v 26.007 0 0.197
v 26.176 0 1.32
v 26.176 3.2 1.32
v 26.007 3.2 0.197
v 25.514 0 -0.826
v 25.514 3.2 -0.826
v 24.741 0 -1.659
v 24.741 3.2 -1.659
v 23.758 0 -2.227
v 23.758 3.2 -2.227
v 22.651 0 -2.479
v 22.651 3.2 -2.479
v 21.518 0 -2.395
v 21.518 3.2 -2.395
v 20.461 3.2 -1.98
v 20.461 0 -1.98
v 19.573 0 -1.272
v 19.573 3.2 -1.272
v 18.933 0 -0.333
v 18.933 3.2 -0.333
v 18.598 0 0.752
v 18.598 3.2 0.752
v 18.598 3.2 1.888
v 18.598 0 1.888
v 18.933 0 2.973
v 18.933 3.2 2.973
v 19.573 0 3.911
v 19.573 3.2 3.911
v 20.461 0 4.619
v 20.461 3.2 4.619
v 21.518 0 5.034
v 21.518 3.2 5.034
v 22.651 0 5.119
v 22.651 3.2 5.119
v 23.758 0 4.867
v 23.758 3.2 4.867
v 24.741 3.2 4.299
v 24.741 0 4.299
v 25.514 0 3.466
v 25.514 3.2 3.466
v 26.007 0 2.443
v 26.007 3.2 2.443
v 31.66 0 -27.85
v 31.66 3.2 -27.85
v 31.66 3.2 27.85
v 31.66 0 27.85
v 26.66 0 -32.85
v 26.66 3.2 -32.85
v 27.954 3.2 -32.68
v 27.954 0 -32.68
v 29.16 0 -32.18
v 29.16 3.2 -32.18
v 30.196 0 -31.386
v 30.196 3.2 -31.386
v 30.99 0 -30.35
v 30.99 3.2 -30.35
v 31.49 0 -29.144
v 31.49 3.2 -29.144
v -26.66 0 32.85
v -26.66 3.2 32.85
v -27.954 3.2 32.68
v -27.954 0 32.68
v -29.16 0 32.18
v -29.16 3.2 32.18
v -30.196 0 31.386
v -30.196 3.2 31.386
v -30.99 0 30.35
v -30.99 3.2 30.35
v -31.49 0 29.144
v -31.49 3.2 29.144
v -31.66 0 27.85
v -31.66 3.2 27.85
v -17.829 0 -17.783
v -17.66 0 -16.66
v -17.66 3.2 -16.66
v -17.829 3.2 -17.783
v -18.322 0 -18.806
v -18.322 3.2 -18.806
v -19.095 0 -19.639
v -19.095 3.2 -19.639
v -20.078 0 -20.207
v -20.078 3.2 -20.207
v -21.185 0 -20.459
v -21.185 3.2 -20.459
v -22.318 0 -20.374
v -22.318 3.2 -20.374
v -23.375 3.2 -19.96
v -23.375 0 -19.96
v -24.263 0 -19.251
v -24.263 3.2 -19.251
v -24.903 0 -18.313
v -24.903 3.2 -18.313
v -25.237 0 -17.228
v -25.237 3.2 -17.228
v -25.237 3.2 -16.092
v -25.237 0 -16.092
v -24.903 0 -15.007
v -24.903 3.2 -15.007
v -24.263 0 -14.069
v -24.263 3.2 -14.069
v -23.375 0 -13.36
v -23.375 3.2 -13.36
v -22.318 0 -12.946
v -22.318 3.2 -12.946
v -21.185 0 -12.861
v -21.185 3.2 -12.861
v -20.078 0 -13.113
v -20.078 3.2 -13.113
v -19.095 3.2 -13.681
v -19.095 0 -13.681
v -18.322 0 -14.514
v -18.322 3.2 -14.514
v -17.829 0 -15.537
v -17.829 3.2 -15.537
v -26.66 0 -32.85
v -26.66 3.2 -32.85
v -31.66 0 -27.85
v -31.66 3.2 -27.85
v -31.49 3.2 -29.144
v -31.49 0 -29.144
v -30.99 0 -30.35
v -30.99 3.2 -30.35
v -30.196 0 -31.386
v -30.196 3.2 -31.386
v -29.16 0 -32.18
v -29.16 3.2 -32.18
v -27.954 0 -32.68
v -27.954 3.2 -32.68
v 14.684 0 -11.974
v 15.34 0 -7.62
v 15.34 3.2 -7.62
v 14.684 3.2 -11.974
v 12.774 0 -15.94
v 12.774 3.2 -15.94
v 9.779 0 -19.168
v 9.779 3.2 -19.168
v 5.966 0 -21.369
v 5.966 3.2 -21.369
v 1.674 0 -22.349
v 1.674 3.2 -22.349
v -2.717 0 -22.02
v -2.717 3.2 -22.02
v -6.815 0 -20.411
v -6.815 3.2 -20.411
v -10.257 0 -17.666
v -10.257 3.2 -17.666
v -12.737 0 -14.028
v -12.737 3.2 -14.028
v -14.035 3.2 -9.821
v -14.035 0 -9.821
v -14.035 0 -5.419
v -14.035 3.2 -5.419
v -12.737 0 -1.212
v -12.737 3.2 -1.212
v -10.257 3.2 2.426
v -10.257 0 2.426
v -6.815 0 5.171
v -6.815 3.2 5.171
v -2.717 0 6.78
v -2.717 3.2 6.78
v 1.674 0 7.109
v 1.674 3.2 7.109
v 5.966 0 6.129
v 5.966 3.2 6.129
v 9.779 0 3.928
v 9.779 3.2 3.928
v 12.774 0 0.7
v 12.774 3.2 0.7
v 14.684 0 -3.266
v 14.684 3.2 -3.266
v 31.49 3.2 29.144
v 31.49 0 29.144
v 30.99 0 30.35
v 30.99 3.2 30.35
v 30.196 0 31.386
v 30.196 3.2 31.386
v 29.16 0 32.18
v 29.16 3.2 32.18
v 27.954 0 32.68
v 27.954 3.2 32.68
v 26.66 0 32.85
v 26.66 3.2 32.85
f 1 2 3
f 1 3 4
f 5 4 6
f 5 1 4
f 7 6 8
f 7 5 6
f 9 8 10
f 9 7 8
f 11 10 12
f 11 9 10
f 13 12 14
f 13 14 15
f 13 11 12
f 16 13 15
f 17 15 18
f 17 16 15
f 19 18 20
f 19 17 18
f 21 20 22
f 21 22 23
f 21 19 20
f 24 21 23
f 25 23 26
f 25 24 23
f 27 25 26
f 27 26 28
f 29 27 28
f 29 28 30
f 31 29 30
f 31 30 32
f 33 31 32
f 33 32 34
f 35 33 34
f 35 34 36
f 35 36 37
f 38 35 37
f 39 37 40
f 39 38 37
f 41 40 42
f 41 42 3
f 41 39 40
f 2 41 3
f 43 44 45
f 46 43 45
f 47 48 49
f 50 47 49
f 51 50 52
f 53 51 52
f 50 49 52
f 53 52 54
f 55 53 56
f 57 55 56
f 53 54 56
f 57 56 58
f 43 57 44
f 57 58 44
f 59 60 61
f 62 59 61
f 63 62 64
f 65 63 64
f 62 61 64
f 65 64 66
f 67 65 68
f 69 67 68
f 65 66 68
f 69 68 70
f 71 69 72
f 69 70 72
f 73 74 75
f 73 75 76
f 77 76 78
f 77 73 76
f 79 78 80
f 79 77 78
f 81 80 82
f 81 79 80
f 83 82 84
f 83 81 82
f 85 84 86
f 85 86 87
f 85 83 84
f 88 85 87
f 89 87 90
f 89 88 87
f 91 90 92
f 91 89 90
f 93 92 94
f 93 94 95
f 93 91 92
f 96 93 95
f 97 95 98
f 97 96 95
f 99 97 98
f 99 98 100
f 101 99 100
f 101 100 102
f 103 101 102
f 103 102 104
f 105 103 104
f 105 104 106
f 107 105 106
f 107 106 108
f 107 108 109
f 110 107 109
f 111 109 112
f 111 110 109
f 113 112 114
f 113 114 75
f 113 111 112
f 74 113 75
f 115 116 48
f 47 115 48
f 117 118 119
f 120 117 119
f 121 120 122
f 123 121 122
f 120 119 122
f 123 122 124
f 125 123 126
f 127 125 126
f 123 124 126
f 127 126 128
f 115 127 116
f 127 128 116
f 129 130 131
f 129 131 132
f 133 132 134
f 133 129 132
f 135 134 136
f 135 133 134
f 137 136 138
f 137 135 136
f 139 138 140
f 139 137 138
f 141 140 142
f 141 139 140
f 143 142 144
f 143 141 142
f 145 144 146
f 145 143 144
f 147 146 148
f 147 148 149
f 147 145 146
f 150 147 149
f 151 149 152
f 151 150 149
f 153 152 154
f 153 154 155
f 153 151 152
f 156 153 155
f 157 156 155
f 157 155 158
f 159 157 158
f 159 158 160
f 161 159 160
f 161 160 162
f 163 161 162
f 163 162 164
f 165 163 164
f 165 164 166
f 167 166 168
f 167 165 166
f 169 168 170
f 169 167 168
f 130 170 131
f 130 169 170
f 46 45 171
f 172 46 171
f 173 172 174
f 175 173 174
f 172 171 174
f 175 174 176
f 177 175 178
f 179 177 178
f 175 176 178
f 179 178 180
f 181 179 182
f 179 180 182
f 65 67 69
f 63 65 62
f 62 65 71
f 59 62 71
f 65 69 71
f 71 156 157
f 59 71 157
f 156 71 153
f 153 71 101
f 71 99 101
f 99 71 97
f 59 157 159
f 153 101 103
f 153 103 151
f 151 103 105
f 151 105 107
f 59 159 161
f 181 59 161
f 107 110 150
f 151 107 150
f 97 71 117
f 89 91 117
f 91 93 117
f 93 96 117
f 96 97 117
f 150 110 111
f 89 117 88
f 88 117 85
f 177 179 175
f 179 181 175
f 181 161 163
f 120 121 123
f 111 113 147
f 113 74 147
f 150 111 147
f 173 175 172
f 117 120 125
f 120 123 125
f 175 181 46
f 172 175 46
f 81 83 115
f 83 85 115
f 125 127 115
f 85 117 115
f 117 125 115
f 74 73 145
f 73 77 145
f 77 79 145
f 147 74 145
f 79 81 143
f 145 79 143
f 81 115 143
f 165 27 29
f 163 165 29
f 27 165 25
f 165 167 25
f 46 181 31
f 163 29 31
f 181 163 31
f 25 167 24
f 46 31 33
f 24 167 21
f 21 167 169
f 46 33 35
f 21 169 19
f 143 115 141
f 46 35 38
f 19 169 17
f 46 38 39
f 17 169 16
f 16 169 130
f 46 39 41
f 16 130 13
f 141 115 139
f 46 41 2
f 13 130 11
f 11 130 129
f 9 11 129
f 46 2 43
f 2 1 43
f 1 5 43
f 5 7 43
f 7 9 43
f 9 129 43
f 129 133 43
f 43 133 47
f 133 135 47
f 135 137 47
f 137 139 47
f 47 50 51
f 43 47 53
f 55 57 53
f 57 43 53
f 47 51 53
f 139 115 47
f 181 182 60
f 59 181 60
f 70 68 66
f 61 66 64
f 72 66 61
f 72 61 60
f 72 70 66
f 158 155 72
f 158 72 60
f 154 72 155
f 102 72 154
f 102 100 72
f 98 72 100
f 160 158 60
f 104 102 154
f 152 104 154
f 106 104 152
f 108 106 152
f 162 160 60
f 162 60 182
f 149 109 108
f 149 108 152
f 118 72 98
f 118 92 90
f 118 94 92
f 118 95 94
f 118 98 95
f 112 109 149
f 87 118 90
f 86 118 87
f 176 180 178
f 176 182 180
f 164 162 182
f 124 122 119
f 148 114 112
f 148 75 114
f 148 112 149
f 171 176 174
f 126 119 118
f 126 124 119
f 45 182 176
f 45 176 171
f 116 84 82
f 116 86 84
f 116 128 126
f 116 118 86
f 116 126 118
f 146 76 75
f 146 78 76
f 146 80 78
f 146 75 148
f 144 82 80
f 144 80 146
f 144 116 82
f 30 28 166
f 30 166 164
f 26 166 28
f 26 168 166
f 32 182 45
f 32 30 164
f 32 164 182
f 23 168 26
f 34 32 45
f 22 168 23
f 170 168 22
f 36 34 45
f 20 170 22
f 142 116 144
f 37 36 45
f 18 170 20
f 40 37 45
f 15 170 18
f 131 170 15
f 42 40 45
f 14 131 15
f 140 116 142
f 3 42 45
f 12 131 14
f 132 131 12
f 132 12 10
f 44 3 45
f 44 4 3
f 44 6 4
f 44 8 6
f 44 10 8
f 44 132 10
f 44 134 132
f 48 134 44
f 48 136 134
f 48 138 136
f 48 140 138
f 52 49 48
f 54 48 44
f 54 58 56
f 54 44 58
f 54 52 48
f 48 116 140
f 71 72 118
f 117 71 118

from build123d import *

# Parameters (mm, degrees)
SKETCH1_W           = 63.32
SKETCH1_H           = 65.7
SKETCH1_R           = 14.77
SKETCH1_R_2         = 3.81
BOSS_EXTRUDE1_DEPTH = 3.2
SKETCH2_OUTSIDE_W   = 83.58
SKETCH2_OUTSIDE_H   = 85.96
CUT_EXTRUDE1_DEPTH  = 3.2


with BuildPart() as part:
    # Sketch1 → Boss-Extrude1 (new body)
    with BuildSketch(Plane(origin=(0, 0, 0), x_dir=(1, 0, 0), z_dir=(0, 1, 0))):
        Rectangle(SKETCH1_W, SKETCH1_H)
        with Locations((0.57, 7.62)):
            Circle(SKETCH1_R, mode=Mode.SUBTRACT)
        with Locations((-21.47, 16.66)):
            Circle(SKETCH1_R_2, mode=Mode.SUBTRACT)
        with Locations((22.365921653, -1.31988801)):
            Circle(SKETCH1_R_2, mode=Mode.SUBTRACT)
    extrude(amount=BOSS_EXTRUDE1_DEPTH)

    # Sketch2 outside → Cut-Extrude1 (cut)
    with BuildSketch(Plane(origin=(0, 3.2, 0), x_dir=(1, 0, 0), z_dir=(0, 1, 0))):
        Rectangle(SKETCH2_OUTSIDE_W, SKETCH2_OUTSIDE_H)
        with BuildLine():
            Line((26.66, -32.85), (-26.66, -32.85))
            ThreePointArc((-26.66, -32.85), (-30.195533906, -31.385533906), (-31.66, -27.85))
            Line((-31.66, -27.85), (-31.66, 27.85))
            ThreePointArc((-31.66, 27.85), (-30.195533906, 31.385533906), (-26.66, 32.85))
            Line((-26.66, 32.85), (26.66, 32.85))
            ThreePointArc((26.66, 32.85), (30.195533906, 31.385533906), (31.66, 27.85))
            Line((31.66, 27.85), (31.66, -27.85))
            ThreePointArc((31.66, -27.85), (30.195533906, -31.385533906), (26.66, -32.85))
        make_face(mode=Mode.SUBTRACT)
    extrude(amount=-CUT_EXTRUDE1_DEPTH, mode=Mode.SUBTRACT)


solid = part.part
